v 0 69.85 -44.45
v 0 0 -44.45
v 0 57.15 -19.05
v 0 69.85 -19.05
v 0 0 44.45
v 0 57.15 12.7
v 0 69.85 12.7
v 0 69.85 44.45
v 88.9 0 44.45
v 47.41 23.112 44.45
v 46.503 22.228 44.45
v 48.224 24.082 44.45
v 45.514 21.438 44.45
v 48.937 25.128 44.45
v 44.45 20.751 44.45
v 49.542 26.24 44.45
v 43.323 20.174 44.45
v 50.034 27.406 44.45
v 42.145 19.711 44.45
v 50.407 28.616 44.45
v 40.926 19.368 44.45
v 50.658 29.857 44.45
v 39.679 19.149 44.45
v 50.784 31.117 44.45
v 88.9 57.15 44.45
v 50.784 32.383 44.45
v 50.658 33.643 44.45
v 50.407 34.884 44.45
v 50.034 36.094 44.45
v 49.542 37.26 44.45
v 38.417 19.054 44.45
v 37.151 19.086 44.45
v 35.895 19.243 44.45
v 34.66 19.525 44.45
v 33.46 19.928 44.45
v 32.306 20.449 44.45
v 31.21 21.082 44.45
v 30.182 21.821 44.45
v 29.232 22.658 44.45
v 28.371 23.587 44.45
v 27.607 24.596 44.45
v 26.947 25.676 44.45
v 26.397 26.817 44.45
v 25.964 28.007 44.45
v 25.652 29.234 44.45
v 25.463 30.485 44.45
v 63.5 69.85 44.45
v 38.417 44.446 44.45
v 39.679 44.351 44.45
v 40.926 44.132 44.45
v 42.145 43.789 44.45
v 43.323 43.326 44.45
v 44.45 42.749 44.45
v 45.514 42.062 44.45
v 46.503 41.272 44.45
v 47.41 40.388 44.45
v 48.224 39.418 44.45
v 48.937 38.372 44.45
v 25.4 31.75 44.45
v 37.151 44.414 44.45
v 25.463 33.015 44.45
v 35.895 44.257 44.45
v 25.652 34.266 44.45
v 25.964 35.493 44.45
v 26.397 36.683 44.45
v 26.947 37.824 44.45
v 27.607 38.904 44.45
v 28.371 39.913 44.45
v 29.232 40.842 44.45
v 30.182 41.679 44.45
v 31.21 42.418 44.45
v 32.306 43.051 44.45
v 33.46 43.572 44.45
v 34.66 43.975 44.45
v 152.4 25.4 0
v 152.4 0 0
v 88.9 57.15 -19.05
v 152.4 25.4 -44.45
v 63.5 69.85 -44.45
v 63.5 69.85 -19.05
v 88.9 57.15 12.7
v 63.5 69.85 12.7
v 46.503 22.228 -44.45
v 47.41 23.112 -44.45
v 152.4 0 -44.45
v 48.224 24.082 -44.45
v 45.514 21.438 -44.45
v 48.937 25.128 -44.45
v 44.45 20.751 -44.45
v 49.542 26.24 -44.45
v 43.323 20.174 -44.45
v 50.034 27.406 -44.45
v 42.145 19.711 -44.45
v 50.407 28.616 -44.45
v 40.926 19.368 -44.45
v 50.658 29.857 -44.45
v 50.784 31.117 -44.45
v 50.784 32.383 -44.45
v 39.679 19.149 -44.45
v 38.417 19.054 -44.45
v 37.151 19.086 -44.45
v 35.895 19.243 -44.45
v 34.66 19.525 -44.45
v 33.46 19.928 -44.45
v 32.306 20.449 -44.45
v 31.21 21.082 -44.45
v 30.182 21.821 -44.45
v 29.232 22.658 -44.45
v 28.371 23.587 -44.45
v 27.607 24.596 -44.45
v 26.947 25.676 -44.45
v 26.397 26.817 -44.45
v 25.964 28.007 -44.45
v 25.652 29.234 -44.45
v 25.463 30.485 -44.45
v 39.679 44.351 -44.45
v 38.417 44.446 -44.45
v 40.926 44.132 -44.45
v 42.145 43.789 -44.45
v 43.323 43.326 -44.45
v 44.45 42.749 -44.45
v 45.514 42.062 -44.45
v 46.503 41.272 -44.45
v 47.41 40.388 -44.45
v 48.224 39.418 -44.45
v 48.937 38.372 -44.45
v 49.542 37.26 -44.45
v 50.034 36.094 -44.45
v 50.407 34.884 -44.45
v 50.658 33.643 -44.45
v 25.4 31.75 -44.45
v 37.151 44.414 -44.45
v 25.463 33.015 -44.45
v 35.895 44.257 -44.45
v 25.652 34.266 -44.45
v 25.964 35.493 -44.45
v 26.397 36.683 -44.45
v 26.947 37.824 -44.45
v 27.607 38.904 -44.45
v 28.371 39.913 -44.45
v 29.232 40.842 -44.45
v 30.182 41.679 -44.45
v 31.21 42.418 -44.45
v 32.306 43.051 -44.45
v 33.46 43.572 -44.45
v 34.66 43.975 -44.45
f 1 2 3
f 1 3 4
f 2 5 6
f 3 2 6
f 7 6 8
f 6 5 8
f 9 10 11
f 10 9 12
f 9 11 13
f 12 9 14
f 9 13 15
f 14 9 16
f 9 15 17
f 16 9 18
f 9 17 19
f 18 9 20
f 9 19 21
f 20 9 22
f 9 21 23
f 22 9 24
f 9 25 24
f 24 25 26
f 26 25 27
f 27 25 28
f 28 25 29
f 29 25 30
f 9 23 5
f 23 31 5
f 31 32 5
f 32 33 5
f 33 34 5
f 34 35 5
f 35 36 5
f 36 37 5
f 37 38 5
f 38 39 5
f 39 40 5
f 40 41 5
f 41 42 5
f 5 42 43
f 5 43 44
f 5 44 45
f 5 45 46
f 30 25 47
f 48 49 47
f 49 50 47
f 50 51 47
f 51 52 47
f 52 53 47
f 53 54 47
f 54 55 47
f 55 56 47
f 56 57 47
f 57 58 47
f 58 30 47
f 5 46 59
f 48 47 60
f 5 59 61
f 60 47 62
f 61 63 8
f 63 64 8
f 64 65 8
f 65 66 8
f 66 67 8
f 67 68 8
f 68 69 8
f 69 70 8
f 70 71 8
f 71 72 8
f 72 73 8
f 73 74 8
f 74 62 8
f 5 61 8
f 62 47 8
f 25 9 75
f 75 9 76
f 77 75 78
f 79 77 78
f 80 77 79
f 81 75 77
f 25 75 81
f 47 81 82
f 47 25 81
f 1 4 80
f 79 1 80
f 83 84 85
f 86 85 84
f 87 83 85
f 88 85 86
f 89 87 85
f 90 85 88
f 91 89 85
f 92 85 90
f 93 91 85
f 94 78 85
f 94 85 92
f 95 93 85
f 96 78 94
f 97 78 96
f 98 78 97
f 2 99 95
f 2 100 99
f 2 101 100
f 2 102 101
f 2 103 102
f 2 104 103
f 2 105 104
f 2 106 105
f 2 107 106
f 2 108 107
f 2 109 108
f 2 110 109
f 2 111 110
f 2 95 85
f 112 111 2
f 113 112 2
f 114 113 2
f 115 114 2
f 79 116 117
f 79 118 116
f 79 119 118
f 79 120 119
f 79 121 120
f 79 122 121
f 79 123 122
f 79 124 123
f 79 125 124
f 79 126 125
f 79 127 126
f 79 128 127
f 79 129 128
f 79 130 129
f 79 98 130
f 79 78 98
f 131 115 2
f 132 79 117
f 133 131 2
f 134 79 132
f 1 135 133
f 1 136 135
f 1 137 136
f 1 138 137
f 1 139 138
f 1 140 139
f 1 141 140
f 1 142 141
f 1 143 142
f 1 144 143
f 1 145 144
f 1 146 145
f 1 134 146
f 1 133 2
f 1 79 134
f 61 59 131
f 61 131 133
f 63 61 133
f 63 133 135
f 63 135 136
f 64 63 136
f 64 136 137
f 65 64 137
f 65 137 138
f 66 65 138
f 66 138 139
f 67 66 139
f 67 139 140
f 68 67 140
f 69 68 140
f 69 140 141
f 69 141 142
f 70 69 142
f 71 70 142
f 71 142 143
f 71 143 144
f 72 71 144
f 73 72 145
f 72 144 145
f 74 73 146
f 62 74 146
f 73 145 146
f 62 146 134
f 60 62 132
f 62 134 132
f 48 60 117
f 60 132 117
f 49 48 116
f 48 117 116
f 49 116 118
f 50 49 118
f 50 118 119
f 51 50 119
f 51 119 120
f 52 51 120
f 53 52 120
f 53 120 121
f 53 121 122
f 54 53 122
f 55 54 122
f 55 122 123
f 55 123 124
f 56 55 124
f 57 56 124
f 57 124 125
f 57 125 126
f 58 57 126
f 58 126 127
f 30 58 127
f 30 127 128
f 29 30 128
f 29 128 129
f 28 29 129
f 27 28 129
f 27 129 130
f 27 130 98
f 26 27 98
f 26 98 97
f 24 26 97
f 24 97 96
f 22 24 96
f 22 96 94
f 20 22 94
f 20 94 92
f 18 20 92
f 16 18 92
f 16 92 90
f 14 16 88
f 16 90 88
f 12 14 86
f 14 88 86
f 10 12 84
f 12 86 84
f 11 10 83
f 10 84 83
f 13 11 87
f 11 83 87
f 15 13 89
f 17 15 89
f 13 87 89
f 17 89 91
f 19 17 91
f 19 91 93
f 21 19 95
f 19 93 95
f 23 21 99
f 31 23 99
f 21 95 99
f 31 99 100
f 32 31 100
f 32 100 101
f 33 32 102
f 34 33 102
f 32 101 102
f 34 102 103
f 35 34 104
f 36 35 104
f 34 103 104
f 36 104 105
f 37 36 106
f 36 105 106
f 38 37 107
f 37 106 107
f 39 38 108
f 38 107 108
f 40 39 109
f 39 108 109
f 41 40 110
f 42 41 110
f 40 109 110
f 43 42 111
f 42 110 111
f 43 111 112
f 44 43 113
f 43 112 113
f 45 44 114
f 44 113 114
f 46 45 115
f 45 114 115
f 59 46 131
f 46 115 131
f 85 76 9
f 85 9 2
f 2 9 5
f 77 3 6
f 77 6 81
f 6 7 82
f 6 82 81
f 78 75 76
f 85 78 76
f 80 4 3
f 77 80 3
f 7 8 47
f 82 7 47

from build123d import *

# Parameters (mm, degrees)
BOSS_EXTRUDE1_DEPTH      = 44.45
SKETCH2_W                = 88.9
SKETCH2_H                = 31.75
CUT_EXTRUDE1_DEPTH       = 12.7
CUT_EXTRUDE2_DEPTH       = 70.85
F_1_4_1_DIAMETER_HOLE1_D = 25.4


with BuildPart() as part:
    # Sketch1 → Boss-Extrude1 (new body, symmetric)
    with BuildSketch(Plane.XY):
        Polygon((0, 0), (0, 69.85), (63.5, 69.85), (88.9, 57.15), (152.4, 25.4), (152.4, 0), align=None)
    extrude(amount=BOSS_EXTRUDE1_DEPTH, both=True)

    # Sketch2 → Cut-Extrude1 (cut)
    with BuildSketch(Plane(origin=(0, 69.85, 0), x_dir=(1, 0, 0), z_dir=(0, 1, 0))):
        with Locations((44.45, 3.175)):
            Rectangle(SKETCH2_W, SKETCH2_H)
    extrude(amount=-CUT_EXTRUDE1_DEPTH, mode=Mode.SUBTRACT)

    # Sketch3 → Cut-Extrude2 (cut, through all)
    with BuildSketch(Plane(origin=(0, 0, 0), x_dir=(1, 0, 0), z_dir=(0, 1, 0))):
        Polygon((88.9, -44.45), (152.4, 0), (152.4, -44.45), align=None)
    extrude(amount=CUT_EXTRUDE2_DEPTH, mode=Mode.SUBTRACT)

    # 1/4 (1) Diameter Hole1 (through all)
    with Locations(Plane.XY.offset(44.45)):
        with Locations((38.1, 31.75)):
            Hole(F_1_4_1_DIAMETER_HOLE1_D / 2)


solid = part.part
